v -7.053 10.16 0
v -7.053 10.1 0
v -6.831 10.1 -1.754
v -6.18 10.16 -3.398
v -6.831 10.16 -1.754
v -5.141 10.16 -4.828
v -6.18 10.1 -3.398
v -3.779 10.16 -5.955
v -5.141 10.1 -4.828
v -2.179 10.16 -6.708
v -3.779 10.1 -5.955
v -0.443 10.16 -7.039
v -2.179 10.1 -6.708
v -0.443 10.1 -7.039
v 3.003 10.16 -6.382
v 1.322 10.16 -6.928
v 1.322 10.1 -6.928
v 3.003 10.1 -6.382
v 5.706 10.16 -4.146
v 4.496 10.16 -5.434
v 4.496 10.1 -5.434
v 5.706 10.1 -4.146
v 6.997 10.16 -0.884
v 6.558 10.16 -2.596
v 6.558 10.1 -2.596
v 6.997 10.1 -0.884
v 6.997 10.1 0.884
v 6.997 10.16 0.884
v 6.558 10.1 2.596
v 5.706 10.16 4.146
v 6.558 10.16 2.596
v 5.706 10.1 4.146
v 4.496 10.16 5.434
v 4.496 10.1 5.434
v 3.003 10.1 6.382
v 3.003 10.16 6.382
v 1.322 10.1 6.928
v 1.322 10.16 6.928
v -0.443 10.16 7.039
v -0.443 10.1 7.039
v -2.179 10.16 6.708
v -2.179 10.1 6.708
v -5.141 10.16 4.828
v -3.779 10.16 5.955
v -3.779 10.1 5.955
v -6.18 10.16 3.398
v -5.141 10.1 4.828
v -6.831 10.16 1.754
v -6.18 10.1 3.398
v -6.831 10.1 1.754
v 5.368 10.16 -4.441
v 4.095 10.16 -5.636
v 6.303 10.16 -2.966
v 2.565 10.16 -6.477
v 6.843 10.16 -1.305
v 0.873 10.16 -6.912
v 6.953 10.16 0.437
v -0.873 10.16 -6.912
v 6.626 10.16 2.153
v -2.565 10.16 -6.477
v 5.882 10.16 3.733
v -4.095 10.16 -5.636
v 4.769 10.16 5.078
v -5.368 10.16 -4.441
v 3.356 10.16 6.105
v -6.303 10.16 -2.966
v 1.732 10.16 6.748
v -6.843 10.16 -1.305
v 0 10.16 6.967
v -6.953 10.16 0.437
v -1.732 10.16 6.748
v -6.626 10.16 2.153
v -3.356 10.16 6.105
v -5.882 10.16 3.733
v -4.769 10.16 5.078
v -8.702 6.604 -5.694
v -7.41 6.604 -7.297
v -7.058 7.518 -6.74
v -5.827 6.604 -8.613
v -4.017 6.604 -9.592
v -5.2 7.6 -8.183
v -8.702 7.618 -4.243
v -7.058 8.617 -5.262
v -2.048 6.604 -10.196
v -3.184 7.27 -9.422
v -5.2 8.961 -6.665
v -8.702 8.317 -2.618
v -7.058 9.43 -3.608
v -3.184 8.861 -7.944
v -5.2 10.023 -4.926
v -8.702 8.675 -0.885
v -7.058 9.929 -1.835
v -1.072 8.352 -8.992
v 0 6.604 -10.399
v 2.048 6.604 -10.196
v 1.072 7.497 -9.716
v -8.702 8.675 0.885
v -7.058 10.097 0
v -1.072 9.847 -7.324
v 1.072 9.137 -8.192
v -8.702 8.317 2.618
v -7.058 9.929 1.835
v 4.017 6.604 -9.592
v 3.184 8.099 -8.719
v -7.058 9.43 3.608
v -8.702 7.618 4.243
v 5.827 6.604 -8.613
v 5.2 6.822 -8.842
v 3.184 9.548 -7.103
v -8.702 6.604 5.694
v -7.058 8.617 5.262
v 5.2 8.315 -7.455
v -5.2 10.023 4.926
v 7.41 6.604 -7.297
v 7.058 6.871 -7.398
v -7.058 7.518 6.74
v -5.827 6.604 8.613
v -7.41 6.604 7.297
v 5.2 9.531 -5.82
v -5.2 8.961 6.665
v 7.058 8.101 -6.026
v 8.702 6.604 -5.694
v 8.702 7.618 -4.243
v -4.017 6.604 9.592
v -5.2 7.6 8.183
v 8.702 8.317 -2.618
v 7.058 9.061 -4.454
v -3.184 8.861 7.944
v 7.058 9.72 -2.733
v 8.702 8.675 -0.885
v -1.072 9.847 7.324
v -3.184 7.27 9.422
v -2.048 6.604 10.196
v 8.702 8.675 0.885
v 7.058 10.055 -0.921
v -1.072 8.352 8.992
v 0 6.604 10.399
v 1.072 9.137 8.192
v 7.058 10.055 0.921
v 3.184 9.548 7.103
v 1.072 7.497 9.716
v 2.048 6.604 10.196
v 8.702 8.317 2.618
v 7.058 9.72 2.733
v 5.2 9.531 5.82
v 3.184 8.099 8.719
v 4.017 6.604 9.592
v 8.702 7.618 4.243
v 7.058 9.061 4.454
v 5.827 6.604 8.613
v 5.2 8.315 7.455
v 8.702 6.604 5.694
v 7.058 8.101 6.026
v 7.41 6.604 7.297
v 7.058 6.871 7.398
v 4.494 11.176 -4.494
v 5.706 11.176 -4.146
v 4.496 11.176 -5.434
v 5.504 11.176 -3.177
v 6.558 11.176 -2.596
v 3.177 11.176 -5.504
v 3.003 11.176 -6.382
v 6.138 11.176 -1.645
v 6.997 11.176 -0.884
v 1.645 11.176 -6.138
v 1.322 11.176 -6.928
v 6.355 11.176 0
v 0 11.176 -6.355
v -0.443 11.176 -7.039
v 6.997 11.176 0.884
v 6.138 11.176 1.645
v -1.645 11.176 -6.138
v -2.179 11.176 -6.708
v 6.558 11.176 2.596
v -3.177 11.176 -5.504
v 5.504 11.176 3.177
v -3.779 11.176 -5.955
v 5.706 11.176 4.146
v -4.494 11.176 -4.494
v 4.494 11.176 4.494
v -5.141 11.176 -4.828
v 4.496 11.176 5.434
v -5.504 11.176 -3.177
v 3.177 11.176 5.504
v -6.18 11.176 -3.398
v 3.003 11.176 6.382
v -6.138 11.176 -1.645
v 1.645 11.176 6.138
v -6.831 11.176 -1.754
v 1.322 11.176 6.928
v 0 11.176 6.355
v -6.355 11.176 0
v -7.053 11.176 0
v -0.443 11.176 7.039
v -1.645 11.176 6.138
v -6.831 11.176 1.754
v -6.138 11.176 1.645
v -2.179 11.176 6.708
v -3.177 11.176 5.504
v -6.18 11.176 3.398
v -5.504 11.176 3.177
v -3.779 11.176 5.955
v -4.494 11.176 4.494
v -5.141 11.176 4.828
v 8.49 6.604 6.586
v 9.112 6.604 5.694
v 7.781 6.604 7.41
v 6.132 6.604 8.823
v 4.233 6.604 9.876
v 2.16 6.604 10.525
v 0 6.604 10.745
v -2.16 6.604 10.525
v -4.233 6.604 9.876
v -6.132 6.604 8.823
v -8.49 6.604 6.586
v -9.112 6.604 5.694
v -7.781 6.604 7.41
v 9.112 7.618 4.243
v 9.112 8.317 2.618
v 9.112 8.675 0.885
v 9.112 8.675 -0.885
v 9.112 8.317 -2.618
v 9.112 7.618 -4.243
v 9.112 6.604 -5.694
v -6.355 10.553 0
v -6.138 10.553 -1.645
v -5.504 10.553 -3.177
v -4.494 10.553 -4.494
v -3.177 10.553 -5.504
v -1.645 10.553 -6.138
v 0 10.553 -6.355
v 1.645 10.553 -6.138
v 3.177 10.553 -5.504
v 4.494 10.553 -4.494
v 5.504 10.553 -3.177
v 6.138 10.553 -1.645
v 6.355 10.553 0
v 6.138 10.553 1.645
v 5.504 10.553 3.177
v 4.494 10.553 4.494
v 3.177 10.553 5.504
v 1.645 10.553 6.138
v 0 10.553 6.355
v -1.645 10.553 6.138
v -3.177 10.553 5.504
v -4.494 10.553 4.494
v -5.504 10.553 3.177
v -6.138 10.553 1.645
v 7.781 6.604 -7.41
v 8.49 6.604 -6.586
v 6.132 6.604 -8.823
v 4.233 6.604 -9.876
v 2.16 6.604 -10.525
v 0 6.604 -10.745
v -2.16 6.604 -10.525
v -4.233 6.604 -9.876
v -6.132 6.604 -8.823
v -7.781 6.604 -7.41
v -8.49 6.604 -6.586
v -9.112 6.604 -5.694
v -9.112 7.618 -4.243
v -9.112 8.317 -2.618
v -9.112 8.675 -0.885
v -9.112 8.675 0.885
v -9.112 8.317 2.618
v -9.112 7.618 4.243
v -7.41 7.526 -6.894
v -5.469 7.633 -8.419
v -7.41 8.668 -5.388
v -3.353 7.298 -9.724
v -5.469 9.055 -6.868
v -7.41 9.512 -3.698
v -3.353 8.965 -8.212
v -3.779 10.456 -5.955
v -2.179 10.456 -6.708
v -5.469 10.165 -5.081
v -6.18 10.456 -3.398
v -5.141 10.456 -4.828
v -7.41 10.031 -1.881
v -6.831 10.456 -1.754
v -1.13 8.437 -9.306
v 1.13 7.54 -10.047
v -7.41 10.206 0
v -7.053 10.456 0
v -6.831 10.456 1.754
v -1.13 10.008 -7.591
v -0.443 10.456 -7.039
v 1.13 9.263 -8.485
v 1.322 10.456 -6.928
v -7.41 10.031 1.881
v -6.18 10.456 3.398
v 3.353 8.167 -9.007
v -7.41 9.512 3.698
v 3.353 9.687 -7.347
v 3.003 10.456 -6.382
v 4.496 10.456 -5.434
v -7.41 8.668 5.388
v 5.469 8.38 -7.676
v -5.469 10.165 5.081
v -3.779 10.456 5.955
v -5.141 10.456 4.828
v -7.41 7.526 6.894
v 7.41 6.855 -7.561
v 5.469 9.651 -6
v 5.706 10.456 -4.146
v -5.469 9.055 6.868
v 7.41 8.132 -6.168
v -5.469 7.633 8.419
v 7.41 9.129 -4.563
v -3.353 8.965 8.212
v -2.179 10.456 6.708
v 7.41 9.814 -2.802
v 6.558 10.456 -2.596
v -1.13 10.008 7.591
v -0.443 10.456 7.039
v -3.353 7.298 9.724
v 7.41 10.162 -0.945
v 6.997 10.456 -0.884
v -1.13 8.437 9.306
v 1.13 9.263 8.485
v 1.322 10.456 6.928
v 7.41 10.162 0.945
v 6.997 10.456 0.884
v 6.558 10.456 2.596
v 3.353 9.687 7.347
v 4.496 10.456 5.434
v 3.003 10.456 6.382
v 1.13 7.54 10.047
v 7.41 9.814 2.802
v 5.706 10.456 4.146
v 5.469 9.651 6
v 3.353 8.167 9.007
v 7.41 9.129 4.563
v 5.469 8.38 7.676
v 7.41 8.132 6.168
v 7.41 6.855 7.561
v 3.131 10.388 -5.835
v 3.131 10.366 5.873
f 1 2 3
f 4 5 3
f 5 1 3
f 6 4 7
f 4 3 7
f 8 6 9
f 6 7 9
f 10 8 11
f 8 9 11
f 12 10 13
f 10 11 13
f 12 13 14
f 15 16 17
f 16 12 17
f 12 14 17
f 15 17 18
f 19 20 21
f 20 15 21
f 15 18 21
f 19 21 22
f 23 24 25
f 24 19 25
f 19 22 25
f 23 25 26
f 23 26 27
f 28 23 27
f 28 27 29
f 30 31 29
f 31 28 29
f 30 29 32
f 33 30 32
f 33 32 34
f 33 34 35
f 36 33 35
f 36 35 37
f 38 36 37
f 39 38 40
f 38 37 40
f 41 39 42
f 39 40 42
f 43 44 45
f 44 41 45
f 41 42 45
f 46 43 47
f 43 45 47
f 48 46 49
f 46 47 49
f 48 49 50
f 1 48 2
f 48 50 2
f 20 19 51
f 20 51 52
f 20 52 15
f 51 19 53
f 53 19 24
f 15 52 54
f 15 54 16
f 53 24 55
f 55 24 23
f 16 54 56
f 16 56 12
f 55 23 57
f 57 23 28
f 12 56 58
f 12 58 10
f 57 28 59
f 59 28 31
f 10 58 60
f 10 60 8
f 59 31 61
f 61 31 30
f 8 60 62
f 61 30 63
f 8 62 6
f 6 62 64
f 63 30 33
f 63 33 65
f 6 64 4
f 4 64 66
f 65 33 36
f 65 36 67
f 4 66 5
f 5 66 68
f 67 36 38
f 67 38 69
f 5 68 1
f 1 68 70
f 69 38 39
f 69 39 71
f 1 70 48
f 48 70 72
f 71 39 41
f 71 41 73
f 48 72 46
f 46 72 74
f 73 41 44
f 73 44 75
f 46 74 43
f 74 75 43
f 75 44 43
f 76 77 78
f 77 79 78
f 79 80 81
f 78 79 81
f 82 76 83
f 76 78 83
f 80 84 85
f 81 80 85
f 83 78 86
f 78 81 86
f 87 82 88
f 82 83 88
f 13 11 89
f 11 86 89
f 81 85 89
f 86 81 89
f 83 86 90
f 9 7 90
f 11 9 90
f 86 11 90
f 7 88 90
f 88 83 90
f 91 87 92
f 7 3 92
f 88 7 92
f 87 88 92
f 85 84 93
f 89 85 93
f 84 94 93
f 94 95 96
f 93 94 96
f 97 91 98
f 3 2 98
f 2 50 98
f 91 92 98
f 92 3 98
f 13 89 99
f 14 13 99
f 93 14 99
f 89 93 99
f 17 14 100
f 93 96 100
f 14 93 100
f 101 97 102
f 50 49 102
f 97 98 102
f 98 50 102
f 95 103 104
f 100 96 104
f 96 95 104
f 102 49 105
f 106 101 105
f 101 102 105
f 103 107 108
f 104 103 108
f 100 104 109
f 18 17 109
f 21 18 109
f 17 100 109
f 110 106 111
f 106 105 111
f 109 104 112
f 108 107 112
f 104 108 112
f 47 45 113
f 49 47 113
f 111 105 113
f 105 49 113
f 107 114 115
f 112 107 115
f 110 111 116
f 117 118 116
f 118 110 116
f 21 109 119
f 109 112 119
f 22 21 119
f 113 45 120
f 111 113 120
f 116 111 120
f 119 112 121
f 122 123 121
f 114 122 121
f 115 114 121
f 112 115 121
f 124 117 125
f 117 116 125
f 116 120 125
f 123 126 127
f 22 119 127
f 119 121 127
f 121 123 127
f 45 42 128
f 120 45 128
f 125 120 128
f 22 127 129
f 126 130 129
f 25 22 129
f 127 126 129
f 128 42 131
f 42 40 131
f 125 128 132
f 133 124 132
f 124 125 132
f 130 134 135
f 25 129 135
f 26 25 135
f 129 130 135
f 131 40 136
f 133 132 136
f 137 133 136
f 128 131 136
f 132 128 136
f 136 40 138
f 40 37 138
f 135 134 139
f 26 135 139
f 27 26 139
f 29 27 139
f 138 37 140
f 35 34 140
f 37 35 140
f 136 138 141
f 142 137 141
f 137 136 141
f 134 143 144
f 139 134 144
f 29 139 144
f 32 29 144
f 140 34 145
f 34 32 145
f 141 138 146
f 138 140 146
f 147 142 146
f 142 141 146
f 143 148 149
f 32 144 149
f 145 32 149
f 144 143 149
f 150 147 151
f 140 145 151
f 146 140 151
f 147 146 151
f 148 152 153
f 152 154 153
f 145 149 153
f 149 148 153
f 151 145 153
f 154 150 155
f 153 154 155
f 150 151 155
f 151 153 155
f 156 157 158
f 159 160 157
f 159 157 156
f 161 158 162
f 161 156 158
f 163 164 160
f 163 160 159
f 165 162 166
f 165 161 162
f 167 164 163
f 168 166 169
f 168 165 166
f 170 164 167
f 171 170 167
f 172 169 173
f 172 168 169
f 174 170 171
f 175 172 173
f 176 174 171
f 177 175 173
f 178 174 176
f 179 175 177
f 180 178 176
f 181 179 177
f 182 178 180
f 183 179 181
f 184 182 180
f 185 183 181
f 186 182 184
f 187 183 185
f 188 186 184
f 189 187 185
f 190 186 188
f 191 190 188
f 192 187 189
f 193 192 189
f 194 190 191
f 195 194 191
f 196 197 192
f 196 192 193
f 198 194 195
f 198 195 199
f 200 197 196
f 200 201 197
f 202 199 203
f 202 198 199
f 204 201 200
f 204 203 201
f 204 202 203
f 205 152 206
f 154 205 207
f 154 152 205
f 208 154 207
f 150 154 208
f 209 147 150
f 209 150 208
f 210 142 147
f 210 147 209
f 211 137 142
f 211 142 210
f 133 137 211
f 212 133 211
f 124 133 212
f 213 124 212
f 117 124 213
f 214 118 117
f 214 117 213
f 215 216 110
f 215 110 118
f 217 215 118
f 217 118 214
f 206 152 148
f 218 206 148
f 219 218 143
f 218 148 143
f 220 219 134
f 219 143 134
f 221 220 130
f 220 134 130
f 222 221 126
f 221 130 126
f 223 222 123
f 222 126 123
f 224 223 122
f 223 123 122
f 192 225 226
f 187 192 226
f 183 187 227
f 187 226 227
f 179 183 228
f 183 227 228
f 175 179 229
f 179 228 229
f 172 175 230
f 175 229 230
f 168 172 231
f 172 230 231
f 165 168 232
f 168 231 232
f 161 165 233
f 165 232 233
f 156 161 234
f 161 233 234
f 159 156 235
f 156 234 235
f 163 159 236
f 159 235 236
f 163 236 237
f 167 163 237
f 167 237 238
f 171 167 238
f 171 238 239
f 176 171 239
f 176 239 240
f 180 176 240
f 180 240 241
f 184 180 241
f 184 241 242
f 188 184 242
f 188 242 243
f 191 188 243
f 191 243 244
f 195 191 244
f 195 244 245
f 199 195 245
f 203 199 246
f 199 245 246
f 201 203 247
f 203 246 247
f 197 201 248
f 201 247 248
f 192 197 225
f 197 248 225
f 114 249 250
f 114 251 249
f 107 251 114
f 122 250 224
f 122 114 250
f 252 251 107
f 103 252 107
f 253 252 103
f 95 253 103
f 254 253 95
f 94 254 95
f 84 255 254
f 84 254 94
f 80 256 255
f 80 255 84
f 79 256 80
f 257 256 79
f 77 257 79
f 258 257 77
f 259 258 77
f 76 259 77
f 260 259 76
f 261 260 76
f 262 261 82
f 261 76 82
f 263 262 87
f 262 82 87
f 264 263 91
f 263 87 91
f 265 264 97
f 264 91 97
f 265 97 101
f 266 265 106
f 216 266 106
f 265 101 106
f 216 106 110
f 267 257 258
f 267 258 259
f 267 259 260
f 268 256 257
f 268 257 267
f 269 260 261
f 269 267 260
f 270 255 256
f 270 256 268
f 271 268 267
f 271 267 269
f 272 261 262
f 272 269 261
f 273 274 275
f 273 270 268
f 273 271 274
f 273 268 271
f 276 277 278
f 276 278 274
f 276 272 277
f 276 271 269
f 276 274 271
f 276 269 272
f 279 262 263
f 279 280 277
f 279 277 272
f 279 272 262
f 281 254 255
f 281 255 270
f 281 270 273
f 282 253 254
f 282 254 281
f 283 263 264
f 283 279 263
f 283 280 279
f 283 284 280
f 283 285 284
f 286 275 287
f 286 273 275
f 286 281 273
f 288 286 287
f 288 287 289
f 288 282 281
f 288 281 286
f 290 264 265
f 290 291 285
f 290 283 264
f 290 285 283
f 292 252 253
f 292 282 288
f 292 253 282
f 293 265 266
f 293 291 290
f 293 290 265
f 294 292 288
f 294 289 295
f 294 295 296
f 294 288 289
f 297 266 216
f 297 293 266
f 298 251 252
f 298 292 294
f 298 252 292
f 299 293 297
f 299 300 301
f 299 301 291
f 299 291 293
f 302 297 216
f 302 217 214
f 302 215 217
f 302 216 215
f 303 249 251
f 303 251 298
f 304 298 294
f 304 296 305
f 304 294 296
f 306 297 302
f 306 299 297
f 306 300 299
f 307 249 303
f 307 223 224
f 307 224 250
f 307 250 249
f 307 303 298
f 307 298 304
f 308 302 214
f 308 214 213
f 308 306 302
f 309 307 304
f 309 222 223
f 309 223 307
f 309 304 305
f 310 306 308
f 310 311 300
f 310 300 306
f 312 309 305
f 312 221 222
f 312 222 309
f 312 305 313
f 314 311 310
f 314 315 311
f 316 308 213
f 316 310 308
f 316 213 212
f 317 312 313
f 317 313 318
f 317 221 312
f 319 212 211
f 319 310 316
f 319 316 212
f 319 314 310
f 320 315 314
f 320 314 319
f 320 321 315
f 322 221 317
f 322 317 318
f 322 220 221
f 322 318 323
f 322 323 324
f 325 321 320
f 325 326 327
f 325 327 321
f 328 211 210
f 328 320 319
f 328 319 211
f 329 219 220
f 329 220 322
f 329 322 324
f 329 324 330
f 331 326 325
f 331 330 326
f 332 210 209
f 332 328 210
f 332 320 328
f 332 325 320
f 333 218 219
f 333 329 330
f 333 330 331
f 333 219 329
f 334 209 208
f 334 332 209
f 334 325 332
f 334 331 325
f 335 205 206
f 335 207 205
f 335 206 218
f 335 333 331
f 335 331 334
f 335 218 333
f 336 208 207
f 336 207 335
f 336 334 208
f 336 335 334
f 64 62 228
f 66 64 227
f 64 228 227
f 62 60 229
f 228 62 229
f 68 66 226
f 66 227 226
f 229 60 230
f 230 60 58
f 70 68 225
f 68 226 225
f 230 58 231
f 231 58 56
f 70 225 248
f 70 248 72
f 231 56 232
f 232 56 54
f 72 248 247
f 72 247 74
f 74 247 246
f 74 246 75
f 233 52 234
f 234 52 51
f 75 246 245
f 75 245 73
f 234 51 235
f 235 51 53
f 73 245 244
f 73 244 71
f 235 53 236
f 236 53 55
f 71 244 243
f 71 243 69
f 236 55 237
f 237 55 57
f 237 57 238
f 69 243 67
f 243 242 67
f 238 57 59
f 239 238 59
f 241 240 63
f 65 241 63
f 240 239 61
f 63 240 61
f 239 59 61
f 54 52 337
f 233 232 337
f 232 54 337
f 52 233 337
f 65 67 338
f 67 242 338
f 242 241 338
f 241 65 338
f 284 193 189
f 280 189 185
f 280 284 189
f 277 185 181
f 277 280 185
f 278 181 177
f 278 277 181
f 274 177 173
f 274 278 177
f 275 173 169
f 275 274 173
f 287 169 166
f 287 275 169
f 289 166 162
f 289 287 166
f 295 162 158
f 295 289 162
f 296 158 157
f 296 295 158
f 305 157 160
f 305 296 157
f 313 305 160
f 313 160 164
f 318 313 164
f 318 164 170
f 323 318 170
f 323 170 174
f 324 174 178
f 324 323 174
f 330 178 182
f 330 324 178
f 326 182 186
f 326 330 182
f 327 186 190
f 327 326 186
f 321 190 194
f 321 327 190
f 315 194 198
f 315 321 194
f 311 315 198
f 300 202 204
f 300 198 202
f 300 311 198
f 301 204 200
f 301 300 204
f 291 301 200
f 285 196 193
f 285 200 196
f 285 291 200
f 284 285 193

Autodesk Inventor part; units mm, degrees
ref_plane "XY Plane" through (0, 0, 0) normal (0, 0, 1) x (1, 0, 0)
sketch "Sketch1" plane through (0, 0, 0) normal (0, 1, 0) x (-1, 0, 0)
  circle A0 centre (0, 0) radius 12.612
  line L0 (12.612, 0) -> (-12.612, 0)
  circle A1 centre (0, 0) radius 21.59
  dimension "d29" = 43.18
revolve "Revolution1" add sketch "Sketch1" angle 360 about axis through (-12.612, 0, 0) along (1, 0, 0) contours L0 A0 | A0 L0
sketch "Sketch2" plane through (0, 0, 0) normal (0, 1, 0) x (-1, 0, 0)
  circle A0 centre (0, 0) radius 6.3549
extrude "Extrusion1" cut sketch "Sketch2" along normal mid plane 25.4
hole "Hole1" [suppressed]
hole "Hole2" [suppressed]
sketch "Sketch3" plane through (0, 0, 0) normal (0, 1, 0) x (-1, 0, 0)
  point P0 (0, 0)
sketch "Sketch4" plane through (0, 0, 0) normal (1, 0, 0) x (0, 1, 0)
  line L0 (6.604, 13.4644) -> (-12.0538, 13.4644)
  line L1 (-12.0538, 13.4644) -> (-12.0538, -13.0797)
  line L2 (-12.0538, -13.0797) -> (6.604, -13.0797)
  line L3 (6.604, -13.0797) -> (6.604, 13.4644)
  point P0 (0, 0)
extrude "Extrusion2" cut sketch "Sketch4" along normal mid plane 30.48
sketch "Sketch5" plane through (0, 0, 0) normal (1, 0, 0) x (0, 1, 0)
  circle A0 centre (0, 0) radius 8.7198
extrude "Extrusion3" cut sketch "Sketch5" along normal mid plane 30.48
sketch "Sketch6" plane through (0, 0, 0) normal (0, 1, 0) x (-1, 0, 0)
  circle A0 centre (0, 0) radius 6.3549
  circle A1 centre (0, 0) radius 7.0528
extrude "Extrusion4" add sketch "Sketch6" along normal blind 11.176
sketch "Sketch7" plane through (0, 0, 0) normal (0, 1, 0) x (-1, 0, 0)
  circle A0 centre (0, 0) radius 6.3549
  circle A1 centre (0, 0) radius 7.0528
extrude "Extrusion5" cut sketch "Sketch7" along normal blind 10.16
sketch "Sketch8" plane through (0, 0, 0) normal (0, 1, 0) x (-1, 0, 0)
  point P0 (0, 0)
sketch "Sketch9" plane through (0, 0, 0) normal (0, 1, 0) x (-1, 0, 0)
  circle A0 centre (0, 0) radius 12.319
  line L0 (12.319, 0) -> (-12.319, 0)
  dimension "d30" = 24.638
revolve "Revolution2" cut sketch "Sketch9" angle 360 about axis through (-12.319, 0, 0) along (1, 0, 0)
properties part number "side"
